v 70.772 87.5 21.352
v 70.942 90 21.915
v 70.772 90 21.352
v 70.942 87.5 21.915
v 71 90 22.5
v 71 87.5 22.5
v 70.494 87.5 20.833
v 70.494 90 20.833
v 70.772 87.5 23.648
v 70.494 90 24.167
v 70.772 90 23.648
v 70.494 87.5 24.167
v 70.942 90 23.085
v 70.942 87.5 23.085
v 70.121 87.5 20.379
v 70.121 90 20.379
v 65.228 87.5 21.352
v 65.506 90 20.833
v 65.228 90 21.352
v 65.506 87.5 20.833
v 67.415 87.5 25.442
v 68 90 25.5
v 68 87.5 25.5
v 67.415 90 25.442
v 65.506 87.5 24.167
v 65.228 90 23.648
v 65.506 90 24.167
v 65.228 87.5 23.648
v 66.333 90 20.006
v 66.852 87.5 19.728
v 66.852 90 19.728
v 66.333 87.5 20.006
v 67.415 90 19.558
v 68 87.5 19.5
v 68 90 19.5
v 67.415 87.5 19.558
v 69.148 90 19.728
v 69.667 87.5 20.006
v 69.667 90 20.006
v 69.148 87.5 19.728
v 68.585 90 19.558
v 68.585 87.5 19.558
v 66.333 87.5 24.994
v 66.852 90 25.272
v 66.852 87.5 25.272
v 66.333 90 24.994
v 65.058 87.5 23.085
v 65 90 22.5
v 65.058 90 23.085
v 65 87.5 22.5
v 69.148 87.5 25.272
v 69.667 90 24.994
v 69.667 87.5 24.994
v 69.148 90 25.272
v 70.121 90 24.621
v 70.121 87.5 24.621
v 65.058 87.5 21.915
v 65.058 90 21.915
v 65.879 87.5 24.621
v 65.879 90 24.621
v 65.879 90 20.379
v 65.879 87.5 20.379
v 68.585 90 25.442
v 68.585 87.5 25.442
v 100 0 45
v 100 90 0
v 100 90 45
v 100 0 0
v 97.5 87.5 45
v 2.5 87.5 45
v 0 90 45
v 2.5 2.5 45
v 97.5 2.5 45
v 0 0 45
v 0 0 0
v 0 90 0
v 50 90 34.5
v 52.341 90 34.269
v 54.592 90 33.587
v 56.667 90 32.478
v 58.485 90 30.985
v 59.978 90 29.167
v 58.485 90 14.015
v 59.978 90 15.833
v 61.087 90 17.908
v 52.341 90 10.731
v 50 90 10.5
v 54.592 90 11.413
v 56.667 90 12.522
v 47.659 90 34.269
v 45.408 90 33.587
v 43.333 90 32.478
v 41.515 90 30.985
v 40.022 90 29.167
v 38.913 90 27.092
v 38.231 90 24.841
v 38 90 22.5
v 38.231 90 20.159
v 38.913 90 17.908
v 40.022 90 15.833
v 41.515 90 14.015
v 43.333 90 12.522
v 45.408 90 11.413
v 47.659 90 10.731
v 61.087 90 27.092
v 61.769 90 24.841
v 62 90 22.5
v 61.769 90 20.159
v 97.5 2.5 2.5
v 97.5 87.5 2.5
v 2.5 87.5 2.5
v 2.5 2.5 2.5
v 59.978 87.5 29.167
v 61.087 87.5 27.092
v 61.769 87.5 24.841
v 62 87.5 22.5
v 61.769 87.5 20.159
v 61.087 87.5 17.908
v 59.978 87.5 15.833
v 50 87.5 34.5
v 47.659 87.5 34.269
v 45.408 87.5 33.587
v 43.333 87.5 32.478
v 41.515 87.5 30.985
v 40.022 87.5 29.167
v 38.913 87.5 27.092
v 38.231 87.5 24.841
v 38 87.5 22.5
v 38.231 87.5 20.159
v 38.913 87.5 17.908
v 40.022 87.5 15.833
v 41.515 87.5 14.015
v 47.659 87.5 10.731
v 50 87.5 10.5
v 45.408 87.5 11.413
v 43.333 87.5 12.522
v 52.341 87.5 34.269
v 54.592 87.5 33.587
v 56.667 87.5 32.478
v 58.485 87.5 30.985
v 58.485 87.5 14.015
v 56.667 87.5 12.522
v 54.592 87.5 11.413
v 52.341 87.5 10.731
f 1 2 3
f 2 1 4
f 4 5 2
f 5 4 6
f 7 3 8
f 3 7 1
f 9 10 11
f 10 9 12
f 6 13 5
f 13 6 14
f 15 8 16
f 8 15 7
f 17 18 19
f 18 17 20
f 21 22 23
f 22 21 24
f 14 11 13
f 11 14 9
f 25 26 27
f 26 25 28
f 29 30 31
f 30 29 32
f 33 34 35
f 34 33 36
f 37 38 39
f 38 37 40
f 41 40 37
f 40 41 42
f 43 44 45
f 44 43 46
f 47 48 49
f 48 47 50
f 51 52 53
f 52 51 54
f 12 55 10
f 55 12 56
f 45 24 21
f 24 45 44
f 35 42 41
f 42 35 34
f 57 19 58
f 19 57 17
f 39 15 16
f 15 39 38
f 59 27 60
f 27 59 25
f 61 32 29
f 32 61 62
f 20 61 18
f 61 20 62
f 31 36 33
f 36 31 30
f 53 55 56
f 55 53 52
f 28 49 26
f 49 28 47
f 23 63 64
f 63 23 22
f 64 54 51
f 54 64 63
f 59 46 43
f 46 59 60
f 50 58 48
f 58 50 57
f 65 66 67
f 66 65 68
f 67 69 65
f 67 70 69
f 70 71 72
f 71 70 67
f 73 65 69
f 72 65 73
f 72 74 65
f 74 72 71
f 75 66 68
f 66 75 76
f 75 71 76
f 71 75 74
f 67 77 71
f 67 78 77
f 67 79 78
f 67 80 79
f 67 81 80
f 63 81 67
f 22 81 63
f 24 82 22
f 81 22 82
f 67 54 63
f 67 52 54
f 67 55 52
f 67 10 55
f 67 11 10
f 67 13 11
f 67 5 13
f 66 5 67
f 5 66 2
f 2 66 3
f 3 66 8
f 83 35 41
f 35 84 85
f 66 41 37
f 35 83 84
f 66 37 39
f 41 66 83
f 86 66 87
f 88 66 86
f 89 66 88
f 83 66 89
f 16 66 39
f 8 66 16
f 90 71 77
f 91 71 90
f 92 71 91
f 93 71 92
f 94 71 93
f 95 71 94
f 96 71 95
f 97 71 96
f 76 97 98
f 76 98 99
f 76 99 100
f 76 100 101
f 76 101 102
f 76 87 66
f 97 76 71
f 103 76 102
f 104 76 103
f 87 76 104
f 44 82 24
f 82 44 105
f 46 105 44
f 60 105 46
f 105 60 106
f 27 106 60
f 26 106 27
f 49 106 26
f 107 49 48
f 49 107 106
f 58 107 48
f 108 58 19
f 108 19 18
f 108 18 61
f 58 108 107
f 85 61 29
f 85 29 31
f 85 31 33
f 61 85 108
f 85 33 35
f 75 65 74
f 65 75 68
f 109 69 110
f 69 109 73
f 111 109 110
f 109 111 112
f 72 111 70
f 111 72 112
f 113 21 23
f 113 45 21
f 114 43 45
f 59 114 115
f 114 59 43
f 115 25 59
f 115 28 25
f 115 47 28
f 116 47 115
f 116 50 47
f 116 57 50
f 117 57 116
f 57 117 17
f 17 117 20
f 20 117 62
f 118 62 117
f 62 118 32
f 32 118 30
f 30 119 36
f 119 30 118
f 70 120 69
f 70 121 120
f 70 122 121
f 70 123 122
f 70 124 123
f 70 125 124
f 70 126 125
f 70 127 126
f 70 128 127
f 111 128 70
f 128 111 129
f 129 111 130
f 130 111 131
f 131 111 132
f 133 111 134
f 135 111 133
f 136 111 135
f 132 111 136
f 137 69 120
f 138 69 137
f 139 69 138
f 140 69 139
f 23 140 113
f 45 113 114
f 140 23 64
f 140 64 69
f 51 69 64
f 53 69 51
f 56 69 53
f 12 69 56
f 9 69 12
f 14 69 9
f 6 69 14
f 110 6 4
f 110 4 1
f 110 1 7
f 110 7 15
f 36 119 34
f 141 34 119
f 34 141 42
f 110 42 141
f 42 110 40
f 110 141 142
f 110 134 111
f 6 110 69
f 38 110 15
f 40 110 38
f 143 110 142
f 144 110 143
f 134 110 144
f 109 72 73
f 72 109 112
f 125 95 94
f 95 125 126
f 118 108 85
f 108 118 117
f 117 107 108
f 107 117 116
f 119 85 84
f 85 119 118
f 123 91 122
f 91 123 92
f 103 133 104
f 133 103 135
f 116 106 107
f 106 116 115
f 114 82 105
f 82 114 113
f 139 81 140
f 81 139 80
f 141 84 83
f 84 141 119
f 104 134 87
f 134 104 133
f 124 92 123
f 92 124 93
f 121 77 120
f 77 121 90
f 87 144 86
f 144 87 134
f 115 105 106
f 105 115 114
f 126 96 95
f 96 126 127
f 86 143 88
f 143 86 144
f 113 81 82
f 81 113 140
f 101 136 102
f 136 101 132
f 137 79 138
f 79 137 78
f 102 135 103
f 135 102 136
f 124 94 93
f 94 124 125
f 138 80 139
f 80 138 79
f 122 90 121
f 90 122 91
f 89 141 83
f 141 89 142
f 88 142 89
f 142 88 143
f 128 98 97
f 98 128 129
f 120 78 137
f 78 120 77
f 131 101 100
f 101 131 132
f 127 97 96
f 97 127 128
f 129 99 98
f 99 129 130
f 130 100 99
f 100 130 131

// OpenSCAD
$fn = 32;

// ----------------------------------------------------------------------
// Vent box: roundvent enclosure
// ----------------------------------------------------------------------

// --- parameters (mm) ---
box_l = 100;              // box length, X
box_w = 90;               // box width, Y
box_h = 45;               // box height, Z
wall_t = 2.5;             // shell wall thickness
vent_d = 24;              // central vent diameter
ring_d = 6;               // ring hole diameter
n_ring = 6;               // holes in the ring
ring_r = 18;              // ring radius

ring_step = 360 / n_ring;  // ring hole angular step

difference() {
  cube([box_l, box_w, box_h]);
  translate([wall_t, wall_t, wall_t])
    cube([box_l - 2 * wall_t, box_w - 2 * wall_t, box_h]);
  translate([box_l / 2, box_w - wall_t - 1, box_h / 2])
    rotate([-90, 0, 0]) cylinder(h = wall_t + 2, d = vent_d);
  for (i = [0 : n_ring - 1])
    translate([box_l / 2, box_w - wall_t - 1, box_h / 2])
      rotate([0, 0, i * ring_step])
        translate([ring_r, 0, 0]) rotate([-90, 0, 0])
          cylinder(h = wall_t + 2, d = ring_d);
}
